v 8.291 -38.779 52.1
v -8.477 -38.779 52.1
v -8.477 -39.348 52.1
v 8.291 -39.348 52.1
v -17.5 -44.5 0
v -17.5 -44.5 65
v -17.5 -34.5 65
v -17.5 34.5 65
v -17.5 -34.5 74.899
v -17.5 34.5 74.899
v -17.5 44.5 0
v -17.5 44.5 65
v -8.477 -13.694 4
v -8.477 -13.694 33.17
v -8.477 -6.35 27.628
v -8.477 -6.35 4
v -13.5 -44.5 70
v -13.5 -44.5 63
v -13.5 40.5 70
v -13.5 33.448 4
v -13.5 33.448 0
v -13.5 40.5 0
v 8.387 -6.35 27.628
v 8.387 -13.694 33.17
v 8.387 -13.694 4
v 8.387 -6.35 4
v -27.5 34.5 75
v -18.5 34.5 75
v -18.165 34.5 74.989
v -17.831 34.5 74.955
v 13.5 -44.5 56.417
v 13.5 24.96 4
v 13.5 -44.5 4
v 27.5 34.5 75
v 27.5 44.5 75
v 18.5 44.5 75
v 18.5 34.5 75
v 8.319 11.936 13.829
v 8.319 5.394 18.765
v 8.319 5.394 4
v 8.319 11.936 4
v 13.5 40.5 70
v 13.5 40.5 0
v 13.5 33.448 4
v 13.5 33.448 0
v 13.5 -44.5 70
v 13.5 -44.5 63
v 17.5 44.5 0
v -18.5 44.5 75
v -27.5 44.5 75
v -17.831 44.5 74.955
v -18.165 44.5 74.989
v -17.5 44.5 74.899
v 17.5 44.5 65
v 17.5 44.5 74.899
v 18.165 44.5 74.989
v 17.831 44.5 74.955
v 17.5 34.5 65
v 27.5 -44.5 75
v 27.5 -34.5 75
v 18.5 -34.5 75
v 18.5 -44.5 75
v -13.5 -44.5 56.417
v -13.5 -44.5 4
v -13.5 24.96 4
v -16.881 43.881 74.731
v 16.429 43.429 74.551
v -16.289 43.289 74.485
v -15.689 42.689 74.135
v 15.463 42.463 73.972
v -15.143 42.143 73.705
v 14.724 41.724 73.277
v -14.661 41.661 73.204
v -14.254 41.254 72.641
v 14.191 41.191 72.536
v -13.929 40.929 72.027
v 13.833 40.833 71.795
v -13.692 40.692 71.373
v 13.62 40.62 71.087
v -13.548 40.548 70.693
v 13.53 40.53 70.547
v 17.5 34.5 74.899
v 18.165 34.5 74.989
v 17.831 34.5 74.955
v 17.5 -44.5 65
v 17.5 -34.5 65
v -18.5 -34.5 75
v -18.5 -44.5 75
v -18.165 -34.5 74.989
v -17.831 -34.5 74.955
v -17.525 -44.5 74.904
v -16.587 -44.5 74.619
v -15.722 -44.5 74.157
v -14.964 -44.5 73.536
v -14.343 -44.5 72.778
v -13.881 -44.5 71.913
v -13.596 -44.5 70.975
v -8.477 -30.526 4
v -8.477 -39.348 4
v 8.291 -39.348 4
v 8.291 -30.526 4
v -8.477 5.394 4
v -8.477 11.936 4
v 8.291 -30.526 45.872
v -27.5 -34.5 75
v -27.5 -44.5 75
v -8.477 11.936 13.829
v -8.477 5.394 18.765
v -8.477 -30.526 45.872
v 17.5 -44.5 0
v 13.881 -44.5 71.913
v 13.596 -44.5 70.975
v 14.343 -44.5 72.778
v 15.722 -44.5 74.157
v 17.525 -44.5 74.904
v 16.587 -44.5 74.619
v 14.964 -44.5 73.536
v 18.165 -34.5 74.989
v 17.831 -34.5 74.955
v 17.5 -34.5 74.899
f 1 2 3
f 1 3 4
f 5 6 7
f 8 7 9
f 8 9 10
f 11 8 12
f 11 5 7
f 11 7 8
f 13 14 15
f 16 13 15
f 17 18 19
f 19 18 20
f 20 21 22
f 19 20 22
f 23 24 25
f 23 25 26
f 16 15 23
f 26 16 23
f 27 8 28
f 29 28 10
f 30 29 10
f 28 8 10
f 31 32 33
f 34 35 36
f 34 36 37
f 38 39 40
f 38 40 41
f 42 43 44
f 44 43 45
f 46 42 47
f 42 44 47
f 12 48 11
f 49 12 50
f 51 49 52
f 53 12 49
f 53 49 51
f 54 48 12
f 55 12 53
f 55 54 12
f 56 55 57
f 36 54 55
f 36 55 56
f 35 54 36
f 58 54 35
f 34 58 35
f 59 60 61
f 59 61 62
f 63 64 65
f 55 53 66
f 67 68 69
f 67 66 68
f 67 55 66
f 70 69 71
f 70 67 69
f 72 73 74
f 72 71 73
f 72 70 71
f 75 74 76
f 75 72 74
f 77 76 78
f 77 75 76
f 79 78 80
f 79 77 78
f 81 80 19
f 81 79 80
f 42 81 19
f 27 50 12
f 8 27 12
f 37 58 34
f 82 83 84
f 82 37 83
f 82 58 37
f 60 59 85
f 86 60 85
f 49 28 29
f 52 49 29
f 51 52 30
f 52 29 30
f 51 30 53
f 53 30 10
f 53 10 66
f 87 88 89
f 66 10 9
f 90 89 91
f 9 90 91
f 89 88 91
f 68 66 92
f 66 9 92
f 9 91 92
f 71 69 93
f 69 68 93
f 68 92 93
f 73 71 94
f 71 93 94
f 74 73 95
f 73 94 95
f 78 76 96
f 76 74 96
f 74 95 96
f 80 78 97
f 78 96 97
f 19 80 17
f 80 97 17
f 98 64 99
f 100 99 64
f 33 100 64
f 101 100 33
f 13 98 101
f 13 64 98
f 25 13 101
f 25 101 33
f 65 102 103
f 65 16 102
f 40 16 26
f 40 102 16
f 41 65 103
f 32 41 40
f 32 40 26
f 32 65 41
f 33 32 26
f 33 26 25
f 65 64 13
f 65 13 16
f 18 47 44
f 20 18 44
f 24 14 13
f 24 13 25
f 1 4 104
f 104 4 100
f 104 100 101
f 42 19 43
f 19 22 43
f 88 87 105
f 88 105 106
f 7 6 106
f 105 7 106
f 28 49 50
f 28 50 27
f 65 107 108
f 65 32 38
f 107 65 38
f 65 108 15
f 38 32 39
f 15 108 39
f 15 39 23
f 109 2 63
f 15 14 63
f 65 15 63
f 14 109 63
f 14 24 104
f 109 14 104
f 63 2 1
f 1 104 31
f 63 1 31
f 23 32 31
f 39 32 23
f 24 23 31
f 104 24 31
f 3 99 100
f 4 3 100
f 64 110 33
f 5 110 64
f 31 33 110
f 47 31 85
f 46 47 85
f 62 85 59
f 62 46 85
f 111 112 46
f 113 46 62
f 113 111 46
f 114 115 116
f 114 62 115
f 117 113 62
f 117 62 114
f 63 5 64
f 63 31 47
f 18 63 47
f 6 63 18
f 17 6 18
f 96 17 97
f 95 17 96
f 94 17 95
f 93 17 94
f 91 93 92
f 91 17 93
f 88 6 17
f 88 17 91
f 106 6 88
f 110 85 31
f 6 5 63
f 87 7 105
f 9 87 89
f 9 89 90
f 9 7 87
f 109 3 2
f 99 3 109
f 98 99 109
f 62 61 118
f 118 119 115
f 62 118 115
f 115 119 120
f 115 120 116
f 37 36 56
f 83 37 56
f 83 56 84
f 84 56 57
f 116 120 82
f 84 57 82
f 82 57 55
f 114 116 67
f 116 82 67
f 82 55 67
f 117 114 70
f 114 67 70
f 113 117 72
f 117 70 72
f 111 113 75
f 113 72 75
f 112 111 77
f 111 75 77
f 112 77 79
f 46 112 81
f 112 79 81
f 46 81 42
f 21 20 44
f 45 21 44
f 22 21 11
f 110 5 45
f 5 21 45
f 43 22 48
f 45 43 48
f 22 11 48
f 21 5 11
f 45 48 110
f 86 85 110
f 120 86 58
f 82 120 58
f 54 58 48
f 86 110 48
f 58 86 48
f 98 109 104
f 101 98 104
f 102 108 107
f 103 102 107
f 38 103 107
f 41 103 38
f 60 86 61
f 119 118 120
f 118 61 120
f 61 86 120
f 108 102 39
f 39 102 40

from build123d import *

# Parameters (mm, degrees)
F0_W          = 35
F0_H          = 89
F1_DEPTH      = 63
F2_T          = -4
F3_W          = 27
F3_H          = 7.0524177253
F4_DEPTH      = 4.3
F5_DEPTH      = 5.2
F7_DEPTH      = 12
F9_DEPTH      = 28.5
F8_W          = 16.7951798066
F8_H          = 6.5415552817
F10_DEPTH     = 15.6
F8_W_2        = 16.8639151379
F8_H_2        = 7.3436973616
F11_DEPTH     = 29.2
F8_W_3        = 16.7673844844
F8_H_3        = 8.8219475001
F12_DEPTH     = 48.1
F13_W         = 10
F13_H         = 10
F14_DEPTH     = 10
F15_W         = 10
F15_H         = 10
F16_DEPTH     = 10
F19_DEPTH     = 10
F20_DEPTH     = 10
F21_T1_DEPTH  = 97.5
F21_T3_DEPTH  = 27
F21_T8_DEPTH  = 94
F21_T13_DEPTH = 110
F21_T18_DEPTH = 110
F21_T23_DEPTH = 94
F21_T29_DEPTH = 97.5
F21_T35_DEPTH = 39.5
F21_T44_DEPTH = 39.5
F21_T50_DEPTH = 97.5


# Not quite as in the source:
# - a fillet or chamfer that OpenCascade refuses, or shapes differently, is made with other operations: its cross-section is extruded or revolved along the edge and cut away or added


with BuildPart() as f1:
    # F0 (on Top) → F1 (new body)
    with BuildSketch(Plane.XY):
        Rectangle(F0_W, F0_H)
    extrude(amount=F1_DEPTH)

    # F2
    f2_openings = [f1.faces().sort_by_distance(p)[0] for p in [
        (0, 0, 63),
    ]]
    offset(amount=F2_T, openings=f2_openings)

    # F3 (on face) → F4 (cut)
    with BuildSketch(Plane.XY.offset(4)):
        with Locations((0, 36.9737911373)):
            Rectangle(F3_W, F3_H)
    extrude(amount=-F4_DEPTH, mode=Mode.SUBTRACT)

    # F5 (cut): a face of the model
    f5_faces = [f1.faces().sort_by_distance(p)[0] for p in [
        (0, -40.5, 33.5),
    ]]
    extrude(f5_faces, amount=-F5_DEPTH, mode=Mode.SUBTRACT)

    # F7 (add): a face of the model
    f7_faces = [f1.faces().sort_by_distance(p)[0] for p in [
        (-16.5436527827, 0, 63),
    ]]
    extrude(f7_faces, amount=F7_DEPTH)

    # F6 (on face) → F9 (join)
    with BuildSketch(Plane(origin=(13.5, 0, 0), x_dir=(0, -1, 0), z_dir=(-1, 0, 0))):
        Polygon((44.5, 63), (-33.4475822747, 4), (-24.9599814415, 4), (44.5, 56.4169287682), align=None)
    extrude(amount=F9_DEPTH)

    # F8 (on face) → F10 (join)
    with BuildSketch(Plane.XY.offset(4)):
        with Locations((-0.0789728947, 8.664857829)):
            Rectangle(F8_W, F8_H)
    extrude(amount=F10_DEPTH)

    # F8 (on face) → F11 (join)
    with BuildSketch(Plane.XY.offset(4)):
        with Locations((-0.044605229, -10.0223287009)):
            Rectangle(F8_W_2, F8_H_2)
    extrude(amount=F11_DEPTH)

    # F8 (on face) → F12 (join)
    with BuildSketch(Plane.XY.offset(4)):
        with Locations((-0.0928705558, -34.9372858182)):
            Rectangle(F8_W_3, F8_H_3)
    extrude(amount=F12_DEPTH)

    # F13 (on face) → F14 (join)
    with BuildSketch(Plane.YZ.offset(17.5)):
        with Locations((-39.5, 70)):
            Rectangle(F13_W, F13_H)
        with Locations((39.5, 70)):
            Rectangle(F13_W, F13_H)
    extrude(amount=F14_DEPTH)

    # F15 (on face) → F16 (join)
    with BuildSketch(Plane(origin=(-17.5, 0, 0), x_dir=(0, -1, 0), z_dir=(-1, 0, 0))):
        with Locations((-39.5, 70)):
            Rectangle(F15_W, F15_H)
        with Locations((39.5, 70)):
            Rectangle(F15_W, F15_H)
    extrude(amount=F16_DEPTH)

    # F18 (on face) → F19 (cut)
    with BuildSketch(Plane.XZ.offset(44.5)):
        Polygon((-17.5, 65), (-27.5, 75), (-27.5, 65), align=None)
        Polygon((27.5, 75), (17.5, 65), (27.5, 65), align=None)
    extrude(amount=-F19_DEPTH, mode=Mode.SUBTRACT)

    # F17 (on face) → F20 (cut)
    with BuildSketch(Plane(origin=(0, 44.5, 0), x_dir=(-1, 0, 0), z_dir=(0, 1, 0))):
        Polygon((-17.5, 65), (-27.5, 75), (-27.5, 65), align=None)
        Polygon((27.5, 65), (27.5, 75), (17.5, 65), align=None)
    extrude(amount=-F20_DEPTH, mode=Mode.SUBTRACT)

    # F21: fillet of radius 5 on 7 edges, made by hand

    # F21_s2 → F21_t1 (cut)
    with BuildSketch(Plane.XZ.offset(-40.5)):
        with BuildLine():
            ThreePointArc((-18.5, 75), (-14.9644660941, 73.5355339059), (-13.5, 70))
            Line((-13.5, 70), (-13.5, 75))
            Line((-13.5, 75), (-18.5, 75))
        make_face()
        with BuildLine():
            ThreePointArc((18.5, 75), (14.9644660941, 73.5355339059), (13.5, 70))
            Line((13.5, 70), (13.5, 75))
            Line((13.5, 75), (18.5, 75))
        make_face()
    extrude(amount=F21_T1_DEPTH, mode=Mode.SUBTRACT)

    # F21_s4 → F21_t3 (cut)
    with BuildSketch(Plane.YZ.offset(-13.5)):
        with BuildLine():
            ThreePointArc((45.5, 75), (41.9644660941, 73.5355339059), (40.5, 70))
            Line((40.5, 70), (40.5, 75))
            Line((40.5, 75), (45.5, 75))
        make_face()
    extrude(amount=F21_T3_DEPTH, mode=Mode.SUBTRACT)


with BuildPart() as f21_tool6:
    # F21_s7 → F21_t8 (new body)
    with BuildSketch(Plane.XZ.offset(-47)):
        with BuildLine():
            ThreePointArc((-12.5, 75), (-16.0355339059, 73.5355339059), (-17.5, 70))
            Line((-17.5, 70), (-17.5, 75))
            Line((-17.5, 75), (-12.5, 75))
        make_face()
    extrude(amount=F21_T8_DEPTH)

    split(bisect_by=Plane.YZ.offset(-13.5), keep=Keep.TOP)


with BuildPart() as f1_1:
    add(f1.part)

    # F21_t5: cut F21_tool6
    add(f21_tool6.part, mode=Mode.SUBTRACT)


with BuildPart() as f21_tool11:
    # F21_s12 → F21_t13 (new body)
    with BuildSketch(Plane.XZ.offset(57)):
        with BuildLine():
            ThreePointArc((-18.5, 75), (-14.9644660941, 73.5355339059), (-13.5, 70))
            Line((-13.5, 70), (-13.5, 75))
            Line((-13.5, 75), (-18.5, 75))
        make_face()
    extrude(amount=-F21_T13_DEPTH)

    split(bisect_by=Plane.YZ.offset(-17.5), keep=Keep.BOTTOM)


with BuildPart() as f1_2:
    add(f1_1.part)

    # F21_t10: cut F21_tool11
    add(f21_tool11.part, mode=Mode.SUBTRACT)


with BuildPart() as f21_tool16:
    # F21_s17 → F21_t18 (new body)
    with BuildSketch(Plane.XZ.offset(-53)):
        with BuildLine():
            ThreePointArc((18.5, 75), (14.9644660941, 73.5355339059), (13.5, 70))
            Line((13.5, 70), (13.5, 75))
            Line((13.5, 75), (18.5, 75))
        make_face()
    extrude(amount=F21_T18_DEPTH)

    split(bisect_by=Plane.YZ.offset(17.5), keep=Keep.TOP)


with BuildPart() as f1_3:
    add(f1_2.part)

    # F21_t15: cut F21_tool16
    add(f21_tool16.part, mode=Mode.SUBTRACT)


with BuildPart() as f21_tool21:
    # F21_s22 → F21_t23 (new body)
    with BuildSketch(Plane.XZ.offset(47)):
        with BuildLine():
            ThreePointArc((17.5, 70), (16.0355339059, 73.5355339059), (12.5, 75))
            Line((12.5, 75), (17.5, 75))
            Line((17.5, 75), (17.5, 70))
        make_face()
    extrude(amount=-F21_T23_DEPTH)

    split(bisect_by=Plane.YZ.offset(13.5), keep=Keep.BOTTOM)


with BuildPart() as f1_4:
    add(f1_3.part)

    # F21_t20: cut F21_tool21
    add(f21_tool21.part, mode=Mode.SUBTRACT)


with BuildPart() as f21_tool27:
    # F21_s28 → F21_t29 (new body)
    with BuildSketch(Plane.XZ.offset(44.5)):
        with BuildLine():
            ThreePointArc((-18.5, 75), (-14.9644660941, 73.5355339059), (-13.5, 70))
            Line((-13.5, 70), (-13.5, 75))
            Line((-13.5, 75), (-18.5, 75))
        make_face()
    extrude(amount=-F21_T29_DEPTH)

    split(bisect_by=Plane.YZ.offset(-17.5), keep=Keep.TOP)

    split(bisect_by=Plane.XZ.offset(-44.5), keep=Keep.TOP)

    split(bisect_by=Plane.XZ.offset(-40.5), keep=Keep.BOTTOM)


with BuildPart() as f21_tool33:
    # F21_s34 → F21_t35 (new body)
    with BuildSketch(Plane.YZ.offset(13.5)):
        with BuildLine():
            ThreePointArc((45.5, 75), (41.9644660941, 73.5355339059), (40.5, 70))
            Line((40.5, 70), (40.5, 75))
            Line((40.5, 75), (45.5, 75))
        make_face()
    extrude(amount=-F21_T35_DEPTH)

    split(bisect_by=Plane.YZ.offset(-13.5), keep=Keep.BOTTOM)

    split(bisect_by=Plane.XZ.offset(-44.5), keep=Keep.TOP)

    split(bisect_by=Plane(origin=(23.75, 0, 23.75), x_dir=(0, 1, 0), z_dir=(0.7071067812, 0, 0.7071067812)), keep=Keep.TOP)


with BuildPart() as f21_tool27_1:
    add(f21_tool27.part)

    # F21_t39: intersect F21_tool33
    add(f21_tool33.part, mode=Mode.INTERSECT)


with BuildPart() as f1_5:
    add(f1_4.part)

    # F21_t25: cut F21_tool27
    add(f21_tool27_1.part, mode=Mode.SUBTRACT)


with BuildPart() as f21_tool42:
    # F21_s43 → F21_t44 (new body)
    with BuildSketch(Plane.YZ.offset(26)):
        with BuildLine():
            ThreePointArc((45.5, 75), (41.9644660941, 73.5355339059), (40.5, 70))
            Line((40.5, 70), (40.5, 75))
            Line((40.5, 75), (45.5, 75))
        make_face()
    extrude(amount=-F21_T44_DEPTH)

    split(bisect_by=Plane.YZ.offset(13.5), keep=Keep.TOP)

    split(bisect_by=Plane.XZ.offset(-44.5), keep=Keep.TOP)

    split(bisect_by=Plane(origin=(-23.75, 0, 23.75), x_dir=(0, 1, 0), z_dir=(-0.7071067812, 0, 0.7071067812)), keep=Keep.TOP)


with BuildPart() as f21_tool48:
    # F21_s49 → F21_t50 (new body)
    with BuildSketch(Plane.XZ.offset(-53)):
        with BuildLine():
            ThreePointArc((18.5, 75), (14.9644660941, 73.5355339059), (13.5, 70))
            Line((13.5, 70), (13.5, 75))
            Line((13.5, 75), (18.5, 75))
        make_face()
    extrude(amount=F21_T50_DEPTH)

    split(bisect_by=Plane.YZ.offset(17.5), keep=Keep.BOTTOM)

    split(bisect_by=Plane.XZ.offset(-44.5), keep=Keep.TOP)

    split(bisect_by=Plane.XZ.offset(-40.5), keep=Keep.BOTTOM)


with BuildPart() as f21_tool42_1:
    add(f21_tool42.part)

    # F21_t54: intersect F21_tool48
    add(f21_tool48.part, mode=Mode.INTERSECT)


with BuildPart() as f1_6:
    add(f1_5.part)

    # F21_t40: cut F21_tool42
    add(f21_tool42_1.part, mode=Mode.SUBTRACT)


solid = f1_6.part
